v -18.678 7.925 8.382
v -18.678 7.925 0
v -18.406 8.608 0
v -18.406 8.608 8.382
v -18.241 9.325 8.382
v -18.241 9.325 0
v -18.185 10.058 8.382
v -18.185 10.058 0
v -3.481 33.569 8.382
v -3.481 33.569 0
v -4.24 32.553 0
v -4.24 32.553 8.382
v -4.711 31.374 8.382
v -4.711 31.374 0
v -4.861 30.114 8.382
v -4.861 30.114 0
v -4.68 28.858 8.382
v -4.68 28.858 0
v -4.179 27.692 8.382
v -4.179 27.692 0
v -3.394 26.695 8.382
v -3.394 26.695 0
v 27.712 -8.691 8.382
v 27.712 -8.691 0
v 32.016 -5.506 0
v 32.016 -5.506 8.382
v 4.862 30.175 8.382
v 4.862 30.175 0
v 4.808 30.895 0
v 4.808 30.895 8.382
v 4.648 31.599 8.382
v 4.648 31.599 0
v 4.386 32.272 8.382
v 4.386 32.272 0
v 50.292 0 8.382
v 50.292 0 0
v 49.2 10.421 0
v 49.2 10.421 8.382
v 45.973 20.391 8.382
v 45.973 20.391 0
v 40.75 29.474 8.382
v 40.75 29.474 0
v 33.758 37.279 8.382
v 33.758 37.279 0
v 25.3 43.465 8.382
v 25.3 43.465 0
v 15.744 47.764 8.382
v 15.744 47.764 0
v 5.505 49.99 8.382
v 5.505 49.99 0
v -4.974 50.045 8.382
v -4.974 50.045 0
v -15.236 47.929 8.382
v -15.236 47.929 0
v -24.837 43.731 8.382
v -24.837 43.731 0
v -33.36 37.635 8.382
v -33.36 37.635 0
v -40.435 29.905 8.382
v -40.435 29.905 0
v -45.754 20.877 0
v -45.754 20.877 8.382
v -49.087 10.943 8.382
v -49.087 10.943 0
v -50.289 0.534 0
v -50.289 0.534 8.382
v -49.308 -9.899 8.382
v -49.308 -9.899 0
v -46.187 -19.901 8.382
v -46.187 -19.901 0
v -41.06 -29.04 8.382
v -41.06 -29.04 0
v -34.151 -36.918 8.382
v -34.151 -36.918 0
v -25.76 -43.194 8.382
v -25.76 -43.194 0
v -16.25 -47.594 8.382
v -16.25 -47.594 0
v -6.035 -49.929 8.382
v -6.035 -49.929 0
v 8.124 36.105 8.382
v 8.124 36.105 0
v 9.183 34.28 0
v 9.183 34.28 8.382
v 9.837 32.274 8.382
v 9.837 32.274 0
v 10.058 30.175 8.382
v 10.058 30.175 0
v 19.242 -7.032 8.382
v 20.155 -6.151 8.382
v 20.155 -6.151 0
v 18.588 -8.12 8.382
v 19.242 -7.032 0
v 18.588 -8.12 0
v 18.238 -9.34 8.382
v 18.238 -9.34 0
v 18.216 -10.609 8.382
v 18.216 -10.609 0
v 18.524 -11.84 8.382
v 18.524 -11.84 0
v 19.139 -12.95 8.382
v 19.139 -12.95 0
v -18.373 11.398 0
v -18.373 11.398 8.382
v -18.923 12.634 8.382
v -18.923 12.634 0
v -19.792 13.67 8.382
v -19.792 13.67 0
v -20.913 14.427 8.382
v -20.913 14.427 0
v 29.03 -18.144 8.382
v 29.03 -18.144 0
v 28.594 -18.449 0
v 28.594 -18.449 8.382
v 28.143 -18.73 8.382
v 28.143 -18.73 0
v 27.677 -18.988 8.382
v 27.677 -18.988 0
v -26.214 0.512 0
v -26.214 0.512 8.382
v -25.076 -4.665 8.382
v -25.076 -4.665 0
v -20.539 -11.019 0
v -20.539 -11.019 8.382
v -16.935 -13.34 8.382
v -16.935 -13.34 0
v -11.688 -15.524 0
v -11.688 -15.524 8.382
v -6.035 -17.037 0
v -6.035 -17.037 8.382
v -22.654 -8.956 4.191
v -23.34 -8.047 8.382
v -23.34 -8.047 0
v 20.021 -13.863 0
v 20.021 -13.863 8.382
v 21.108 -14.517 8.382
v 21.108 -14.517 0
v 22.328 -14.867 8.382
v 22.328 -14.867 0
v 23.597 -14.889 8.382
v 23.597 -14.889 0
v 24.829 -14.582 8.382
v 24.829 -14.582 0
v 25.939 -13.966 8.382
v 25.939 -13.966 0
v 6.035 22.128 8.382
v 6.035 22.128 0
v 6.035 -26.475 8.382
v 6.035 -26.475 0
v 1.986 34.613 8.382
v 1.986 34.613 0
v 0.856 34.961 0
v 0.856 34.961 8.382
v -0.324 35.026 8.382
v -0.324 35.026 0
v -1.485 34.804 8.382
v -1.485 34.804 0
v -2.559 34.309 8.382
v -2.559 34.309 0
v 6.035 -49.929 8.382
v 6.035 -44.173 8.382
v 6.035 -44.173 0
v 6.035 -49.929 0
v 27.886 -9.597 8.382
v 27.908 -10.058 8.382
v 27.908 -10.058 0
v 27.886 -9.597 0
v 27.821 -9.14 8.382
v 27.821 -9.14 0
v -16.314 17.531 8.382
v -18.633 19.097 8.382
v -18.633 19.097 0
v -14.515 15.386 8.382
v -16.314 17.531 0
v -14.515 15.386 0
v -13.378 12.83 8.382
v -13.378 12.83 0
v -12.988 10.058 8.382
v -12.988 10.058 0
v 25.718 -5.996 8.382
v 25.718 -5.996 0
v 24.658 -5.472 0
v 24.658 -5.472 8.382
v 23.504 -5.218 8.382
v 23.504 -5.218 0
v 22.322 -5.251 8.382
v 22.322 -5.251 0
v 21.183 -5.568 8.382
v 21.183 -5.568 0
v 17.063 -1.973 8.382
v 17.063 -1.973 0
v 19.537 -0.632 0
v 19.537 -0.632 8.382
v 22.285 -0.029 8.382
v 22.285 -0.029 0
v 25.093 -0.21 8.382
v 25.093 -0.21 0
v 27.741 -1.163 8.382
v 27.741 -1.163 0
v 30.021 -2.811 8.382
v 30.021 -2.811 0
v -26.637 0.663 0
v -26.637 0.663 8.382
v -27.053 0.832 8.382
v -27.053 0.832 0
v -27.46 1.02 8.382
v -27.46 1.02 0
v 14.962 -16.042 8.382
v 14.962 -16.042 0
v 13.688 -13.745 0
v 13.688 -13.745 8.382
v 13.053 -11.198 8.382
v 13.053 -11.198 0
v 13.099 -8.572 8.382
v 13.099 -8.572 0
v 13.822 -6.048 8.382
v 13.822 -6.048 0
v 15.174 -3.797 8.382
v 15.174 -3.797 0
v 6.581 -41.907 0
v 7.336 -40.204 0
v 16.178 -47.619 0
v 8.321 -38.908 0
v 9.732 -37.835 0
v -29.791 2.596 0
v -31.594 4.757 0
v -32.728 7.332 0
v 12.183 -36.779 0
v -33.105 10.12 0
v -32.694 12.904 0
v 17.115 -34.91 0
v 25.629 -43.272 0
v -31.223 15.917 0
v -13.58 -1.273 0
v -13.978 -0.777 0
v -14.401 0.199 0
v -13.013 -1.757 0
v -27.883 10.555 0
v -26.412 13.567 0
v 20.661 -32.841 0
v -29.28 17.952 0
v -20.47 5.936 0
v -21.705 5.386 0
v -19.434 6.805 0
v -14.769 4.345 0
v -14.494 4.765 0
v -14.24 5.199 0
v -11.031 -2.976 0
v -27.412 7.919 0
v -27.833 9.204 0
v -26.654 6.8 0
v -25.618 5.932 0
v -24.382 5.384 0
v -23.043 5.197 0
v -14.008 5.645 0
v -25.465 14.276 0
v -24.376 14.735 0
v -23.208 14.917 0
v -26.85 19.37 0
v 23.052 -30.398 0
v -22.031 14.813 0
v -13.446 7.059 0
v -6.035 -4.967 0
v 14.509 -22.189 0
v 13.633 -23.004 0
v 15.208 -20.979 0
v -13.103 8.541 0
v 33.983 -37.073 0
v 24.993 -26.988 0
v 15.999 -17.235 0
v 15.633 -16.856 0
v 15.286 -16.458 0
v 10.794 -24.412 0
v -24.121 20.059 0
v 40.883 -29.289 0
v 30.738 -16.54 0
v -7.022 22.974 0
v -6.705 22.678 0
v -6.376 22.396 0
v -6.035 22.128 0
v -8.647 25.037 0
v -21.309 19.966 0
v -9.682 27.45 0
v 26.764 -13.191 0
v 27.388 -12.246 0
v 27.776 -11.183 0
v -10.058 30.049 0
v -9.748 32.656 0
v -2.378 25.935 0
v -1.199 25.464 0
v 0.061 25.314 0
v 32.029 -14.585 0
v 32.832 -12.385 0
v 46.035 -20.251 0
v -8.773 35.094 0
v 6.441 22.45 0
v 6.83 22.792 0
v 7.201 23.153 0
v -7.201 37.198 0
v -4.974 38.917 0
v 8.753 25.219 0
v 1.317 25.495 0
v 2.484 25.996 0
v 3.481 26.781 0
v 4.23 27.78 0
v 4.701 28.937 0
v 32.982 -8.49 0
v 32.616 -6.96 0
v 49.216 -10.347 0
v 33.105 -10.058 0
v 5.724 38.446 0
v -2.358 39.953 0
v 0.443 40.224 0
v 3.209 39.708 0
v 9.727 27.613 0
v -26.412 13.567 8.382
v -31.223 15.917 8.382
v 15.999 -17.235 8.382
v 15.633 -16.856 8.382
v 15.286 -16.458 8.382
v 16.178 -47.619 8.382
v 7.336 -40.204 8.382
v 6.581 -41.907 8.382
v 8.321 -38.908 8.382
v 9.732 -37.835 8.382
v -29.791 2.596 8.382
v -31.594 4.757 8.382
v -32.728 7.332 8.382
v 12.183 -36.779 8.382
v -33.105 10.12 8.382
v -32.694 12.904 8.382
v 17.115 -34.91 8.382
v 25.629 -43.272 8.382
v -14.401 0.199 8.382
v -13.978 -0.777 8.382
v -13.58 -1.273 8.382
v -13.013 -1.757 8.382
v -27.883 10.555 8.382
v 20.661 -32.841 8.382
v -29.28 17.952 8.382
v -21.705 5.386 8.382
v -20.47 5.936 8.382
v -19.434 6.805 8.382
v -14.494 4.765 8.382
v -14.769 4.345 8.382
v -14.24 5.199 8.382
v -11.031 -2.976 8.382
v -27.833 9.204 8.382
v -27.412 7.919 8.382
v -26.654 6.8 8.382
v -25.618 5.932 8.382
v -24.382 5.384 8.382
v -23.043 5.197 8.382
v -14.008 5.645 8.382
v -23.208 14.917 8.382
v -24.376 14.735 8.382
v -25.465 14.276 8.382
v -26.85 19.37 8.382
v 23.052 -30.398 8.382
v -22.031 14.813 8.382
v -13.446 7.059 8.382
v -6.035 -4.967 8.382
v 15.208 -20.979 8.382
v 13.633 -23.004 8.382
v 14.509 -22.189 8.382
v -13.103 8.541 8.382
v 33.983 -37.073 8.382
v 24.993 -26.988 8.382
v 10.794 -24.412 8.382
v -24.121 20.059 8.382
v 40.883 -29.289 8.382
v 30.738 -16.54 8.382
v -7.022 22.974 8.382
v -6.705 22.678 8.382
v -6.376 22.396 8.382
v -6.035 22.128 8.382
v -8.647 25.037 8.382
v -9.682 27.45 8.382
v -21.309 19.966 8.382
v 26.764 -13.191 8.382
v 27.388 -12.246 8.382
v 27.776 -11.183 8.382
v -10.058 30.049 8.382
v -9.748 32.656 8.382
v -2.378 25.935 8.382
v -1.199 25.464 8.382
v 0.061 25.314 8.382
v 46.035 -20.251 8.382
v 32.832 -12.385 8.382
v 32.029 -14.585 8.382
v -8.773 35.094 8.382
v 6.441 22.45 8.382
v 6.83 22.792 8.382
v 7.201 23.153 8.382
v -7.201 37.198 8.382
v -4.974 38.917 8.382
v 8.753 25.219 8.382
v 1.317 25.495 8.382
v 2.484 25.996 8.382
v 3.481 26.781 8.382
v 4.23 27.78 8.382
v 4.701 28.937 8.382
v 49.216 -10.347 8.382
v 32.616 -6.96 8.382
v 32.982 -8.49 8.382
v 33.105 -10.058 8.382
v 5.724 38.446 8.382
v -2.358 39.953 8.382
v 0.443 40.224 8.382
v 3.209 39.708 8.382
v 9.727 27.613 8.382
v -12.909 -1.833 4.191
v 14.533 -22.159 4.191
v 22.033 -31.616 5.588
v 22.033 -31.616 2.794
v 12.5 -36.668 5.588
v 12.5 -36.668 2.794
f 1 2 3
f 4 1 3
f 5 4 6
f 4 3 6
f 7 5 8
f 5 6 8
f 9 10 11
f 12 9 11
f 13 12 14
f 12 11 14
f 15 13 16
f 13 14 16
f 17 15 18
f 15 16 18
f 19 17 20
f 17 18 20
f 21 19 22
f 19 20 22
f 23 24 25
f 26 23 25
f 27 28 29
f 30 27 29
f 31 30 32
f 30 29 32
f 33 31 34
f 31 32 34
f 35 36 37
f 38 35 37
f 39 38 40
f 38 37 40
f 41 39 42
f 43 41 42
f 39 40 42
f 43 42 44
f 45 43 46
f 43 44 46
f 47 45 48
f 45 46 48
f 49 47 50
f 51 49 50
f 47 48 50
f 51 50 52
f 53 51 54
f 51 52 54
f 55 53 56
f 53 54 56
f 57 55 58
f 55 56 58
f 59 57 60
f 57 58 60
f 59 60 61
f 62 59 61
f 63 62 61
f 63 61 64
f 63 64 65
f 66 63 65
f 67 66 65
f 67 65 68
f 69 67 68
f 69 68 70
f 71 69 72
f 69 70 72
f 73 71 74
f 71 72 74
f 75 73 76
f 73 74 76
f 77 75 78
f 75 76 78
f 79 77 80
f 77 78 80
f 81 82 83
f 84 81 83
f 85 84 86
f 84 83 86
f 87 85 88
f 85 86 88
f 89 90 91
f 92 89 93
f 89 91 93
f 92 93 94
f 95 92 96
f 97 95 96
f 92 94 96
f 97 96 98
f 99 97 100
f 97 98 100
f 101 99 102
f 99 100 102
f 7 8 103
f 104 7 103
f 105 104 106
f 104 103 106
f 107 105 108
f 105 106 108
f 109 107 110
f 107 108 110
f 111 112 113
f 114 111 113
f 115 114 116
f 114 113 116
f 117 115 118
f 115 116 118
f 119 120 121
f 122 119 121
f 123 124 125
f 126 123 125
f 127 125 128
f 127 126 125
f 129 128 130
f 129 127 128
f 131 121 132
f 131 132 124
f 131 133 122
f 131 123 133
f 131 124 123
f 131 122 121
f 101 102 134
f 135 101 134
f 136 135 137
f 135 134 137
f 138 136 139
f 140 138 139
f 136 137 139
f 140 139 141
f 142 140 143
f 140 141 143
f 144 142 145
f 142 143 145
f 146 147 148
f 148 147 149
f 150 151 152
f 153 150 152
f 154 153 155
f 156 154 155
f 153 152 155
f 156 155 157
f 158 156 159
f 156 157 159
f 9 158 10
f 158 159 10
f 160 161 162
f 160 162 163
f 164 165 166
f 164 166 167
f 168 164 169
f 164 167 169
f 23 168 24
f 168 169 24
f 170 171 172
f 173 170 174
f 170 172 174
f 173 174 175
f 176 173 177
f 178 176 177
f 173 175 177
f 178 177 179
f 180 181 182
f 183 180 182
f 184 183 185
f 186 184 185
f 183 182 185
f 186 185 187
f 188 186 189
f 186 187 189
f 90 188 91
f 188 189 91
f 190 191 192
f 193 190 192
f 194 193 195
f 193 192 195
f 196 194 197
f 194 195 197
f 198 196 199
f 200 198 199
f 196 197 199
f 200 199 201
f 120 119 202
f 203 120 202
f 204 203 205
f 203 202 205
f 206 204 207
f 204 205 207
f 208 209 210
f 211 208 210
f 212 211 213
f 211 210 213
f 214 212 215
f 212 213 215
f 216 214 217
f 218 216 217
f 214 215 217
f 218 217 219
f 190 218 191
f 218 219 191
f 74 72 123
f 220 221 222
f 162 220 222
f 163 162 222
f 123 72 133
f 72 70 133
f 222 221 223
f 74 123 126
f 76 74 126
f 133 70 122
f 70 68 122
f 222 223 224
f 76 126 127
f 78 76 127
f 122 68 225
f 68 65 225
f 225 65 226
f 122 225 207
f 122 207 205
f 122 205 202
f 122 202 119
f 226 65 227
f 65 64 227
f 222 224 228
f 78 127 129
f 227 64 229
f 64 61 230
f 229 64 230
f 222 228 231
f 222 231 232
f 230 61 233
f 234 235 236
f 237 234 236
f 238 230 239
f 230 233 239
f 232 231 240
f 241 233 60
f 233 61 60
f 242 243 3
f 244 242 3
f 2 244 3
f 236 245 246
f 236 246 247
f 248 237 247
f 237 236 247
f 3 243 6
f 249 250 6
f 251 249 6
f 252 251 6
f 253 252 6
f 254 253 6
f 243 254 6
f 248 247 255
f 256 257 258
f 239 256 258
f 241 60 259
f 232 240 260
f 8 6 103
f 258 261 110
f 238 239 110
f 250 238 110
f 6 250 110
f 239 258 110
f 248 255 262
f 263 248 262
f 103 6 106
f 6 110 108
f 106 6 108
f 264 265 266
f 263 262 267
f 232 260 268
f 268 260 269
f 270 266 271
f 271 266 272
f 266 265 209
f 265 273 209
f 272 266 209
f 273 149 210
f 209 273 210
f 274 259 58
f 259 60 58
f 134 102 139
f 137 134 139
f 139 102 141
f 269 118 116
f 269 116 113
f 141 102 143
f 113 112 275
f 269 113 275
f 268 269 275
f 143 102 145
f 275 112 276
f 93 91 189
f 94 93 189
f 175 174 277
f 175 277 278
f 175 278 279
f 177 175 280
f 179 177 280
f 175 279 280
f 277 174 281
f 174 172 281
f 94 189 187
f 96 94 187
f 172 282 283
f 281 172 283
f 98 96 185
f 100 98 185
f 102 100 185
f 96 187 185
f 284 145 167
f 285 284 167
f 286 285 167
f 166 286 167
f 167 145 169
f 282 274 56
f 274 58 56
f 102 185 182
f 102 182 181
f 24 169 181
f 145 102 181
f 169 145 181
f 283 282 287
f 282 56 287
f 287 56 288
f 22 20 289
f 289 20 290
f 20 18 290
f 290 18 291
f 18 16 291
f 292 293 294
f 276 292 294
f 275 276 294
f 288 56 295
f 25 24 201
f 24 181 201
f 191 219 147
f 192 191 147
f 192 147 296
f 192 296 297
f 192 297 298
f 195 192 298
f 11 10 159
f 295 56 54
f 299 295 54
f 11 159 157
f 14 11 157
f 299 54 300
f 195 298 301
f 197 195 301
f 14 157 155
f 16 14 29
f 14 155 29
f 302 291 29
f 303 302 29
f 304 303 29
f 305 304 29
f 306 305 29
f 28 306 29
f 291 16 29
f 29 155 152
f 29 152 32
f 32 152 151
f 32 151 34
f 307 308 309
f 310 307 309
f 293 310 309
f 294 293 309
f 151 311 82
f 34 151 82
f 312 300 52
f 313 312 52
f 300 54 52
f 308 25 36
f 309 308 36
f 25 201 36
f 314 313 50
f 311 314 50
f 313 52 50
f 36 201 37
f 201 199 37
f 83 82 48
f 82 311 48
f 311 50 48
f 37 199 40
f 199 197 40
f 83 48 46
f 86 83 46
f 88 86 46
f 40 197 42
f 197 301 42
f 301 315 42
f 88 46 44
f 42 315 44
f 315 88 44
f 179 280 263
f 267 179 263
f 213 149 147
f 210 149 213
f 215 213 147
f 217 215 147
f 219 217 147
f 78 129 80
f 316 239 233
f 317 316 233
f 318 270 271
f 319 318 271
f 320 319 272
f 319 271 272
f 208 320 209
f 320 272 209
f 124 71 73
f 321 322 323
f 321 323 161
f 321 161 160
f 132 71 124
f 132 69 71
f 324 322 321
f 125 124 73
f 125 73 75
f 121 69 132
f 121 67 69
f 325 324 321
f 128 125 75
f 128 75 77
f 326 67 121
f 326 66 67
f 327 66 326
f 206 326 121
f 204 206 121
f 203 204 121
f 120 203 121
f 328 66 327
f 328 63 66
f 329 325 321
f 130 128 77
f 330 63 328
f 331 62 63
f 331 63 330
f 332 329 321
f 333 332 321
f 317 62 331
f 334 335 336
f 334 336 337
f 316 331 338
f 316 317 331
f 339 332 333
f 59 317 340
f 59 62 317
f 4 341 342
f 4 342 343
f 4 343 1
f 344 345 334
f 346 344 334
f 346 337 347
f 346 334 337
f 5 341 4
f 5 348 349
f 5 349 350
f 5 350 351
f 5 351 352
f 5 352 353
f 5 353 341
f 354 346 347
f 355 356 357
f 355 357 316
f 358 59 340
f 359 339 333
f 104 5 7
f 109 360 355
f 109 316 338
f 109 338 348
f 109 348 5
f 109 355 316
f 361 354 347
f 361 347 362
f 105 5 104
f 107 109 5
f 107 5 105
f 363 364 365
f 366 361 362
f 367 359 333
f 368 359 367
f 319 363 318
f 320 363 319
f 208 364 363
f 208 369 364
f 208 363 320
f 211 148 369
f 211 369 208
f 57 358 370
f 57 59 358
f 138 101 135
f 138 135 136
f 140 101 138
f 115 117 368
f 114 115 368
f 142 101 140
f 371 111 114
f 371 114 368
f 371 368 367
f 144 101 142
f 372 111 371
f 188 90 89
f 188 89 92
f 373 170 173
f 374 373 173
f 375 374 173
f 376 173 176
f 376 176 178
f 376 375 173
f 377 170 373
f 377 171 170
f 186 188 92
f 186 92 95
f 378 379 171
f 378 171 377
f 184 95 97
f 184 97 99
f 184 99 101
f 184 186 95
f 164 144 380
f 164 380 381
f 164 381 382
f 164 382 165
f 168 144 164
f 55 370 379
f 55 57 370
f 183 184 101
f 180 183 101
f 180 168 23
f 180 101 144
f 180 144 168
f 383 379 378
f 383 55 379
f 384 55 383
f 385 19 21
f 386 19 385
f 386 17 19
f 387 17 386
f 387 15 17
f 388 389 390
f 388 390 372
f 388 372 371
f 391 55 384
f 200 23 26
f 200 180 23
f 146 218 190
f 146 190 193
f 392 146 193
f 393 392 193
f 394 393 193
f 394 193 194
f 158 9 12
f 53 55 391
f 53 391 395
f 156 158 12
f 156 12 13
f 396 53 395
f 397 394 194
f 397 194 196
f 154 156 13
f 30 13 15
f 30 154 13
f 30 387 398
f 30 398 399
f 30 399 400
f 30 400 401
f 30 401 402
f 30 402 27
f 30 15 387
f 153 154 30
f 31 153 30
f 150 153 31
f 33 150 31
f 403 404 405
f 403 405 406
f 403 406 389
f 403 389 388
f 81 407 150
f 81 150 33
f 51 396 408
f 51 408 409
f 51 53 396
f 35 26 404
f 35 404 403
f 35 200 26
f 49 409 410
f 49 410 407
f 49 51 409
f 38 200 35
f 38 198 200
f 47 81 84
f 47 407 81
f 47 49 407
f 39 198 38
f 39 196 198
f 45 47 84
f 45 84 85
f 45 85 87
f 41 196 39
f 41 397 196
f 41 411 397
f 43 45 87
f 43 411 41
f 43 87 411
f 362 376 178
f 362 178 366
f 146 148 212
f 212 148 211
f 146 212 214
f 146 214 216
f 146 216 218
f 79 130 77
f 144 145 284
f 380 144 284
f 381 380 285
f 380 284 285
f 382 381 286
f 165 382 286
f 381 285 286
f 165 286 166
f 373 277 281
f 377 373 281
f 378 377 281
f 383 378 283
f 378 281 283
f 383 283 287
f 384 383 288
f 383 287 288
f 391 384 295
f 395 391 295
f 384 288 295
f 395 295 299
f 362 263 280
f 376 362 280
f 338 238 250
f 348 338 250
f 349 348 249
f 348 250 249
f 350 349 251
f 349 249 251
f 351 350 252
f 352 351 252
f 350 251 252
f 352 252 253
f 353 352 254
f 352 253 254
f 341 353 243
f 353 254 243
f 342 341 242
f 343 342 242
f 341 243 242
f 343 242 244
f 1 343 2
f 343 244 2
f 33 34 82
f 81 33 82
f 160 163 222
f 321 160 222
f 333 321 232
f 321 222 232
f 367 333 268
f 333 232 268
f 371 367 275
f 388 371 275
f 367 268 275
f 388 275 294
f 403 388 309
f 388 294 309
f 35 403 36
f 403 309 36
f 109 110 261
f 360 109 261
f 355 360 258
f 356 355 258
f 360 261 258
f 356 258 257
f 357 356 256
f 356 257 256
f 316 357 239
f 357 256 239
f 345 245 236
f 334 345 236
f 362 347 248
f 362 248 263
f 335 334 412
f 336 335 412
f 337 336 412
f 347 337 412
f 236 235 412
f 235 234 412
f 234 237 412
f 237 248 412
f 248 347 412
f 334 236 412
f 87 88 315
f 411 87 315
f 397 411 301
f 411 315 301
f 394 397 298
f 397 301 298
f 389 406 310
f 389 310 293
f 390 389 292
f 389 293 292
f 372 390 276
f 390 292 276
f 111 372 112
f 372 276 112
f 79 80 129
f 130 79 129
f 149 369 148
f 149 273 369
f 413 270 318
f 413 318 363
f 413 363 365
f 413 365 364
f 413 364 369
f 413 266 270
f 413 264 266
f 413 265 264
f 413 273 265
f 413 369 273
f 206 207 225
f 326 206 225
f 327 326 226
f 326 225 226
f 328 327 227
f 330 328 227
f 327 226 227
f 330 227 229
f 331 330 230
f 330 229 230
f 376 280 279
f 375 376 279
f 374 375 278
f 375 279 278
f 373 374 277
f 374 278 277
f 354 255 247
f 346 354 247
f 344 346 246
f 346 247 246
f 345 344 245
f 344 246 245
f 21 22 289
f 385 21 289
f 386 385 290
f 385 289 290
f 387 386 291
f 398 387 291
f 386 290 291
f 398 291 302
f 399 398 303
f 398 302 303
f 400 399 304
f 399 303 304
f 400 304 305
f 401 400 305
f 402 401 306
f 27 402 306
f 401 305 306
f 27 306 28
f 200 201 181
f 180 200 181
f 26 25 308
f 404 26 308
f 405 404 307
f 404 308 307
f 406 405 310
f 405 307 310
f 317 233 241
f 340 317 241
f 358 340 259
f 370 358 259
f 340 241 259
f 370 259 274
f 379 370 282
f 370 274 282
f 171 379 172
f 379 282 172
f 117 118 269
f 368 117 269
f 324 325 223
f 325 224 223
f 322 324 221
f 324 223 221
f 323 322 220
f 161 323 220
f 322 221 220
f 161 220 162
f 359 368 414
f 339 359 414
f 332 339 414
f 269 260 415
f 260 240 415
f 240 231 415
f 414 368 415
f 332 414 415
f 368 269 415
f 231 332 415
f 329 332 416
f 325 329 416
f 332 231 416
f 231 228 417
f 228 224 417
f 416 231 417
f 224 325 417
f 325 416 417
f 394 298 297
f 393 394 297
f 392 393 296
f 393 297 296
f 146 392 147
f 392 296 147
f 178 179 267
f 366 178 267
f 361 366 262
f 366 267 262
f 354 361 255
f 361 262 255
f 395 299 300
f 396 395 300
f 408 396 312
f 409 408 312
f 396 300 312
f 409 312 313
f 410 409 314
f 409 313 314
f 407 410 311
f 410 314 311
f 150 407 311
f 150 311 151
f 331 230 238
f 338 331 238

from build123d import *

# Parameters (mm, degrees)
F1_DEPTH = 12.7
F2_SCALE = 0.66


with BuildPart() as f1:
    # F0 (on Top) → F1 (new body)
    with BuildSketch(Plane.XY):
        with BuildLine():
            ThreePointArc((9.144, -75.649370546), (57.0228585744, -50.545361805), (76.2, 0))
            ThreePointArc((76.2, 0), (-50.545361805, 57.0228585744), (-9.144, -75.649370546))
            Line((-9.144, -75.649370546), (-9.144, -25.8135372295))
            add(Edge.make_bspline(
                [(-39.7183440202, 0.7753508904), (-39.4440910843, -2.777005422), (-36.553083053, -17.1021078443), (-18.9419593371, -23.7369574995), (-9.144, -25.8135372295)],
                knots=[0, 0, 0, 0, 0.4252369996, 1, 1, 1, 1], degree=3))
            ThreePointArc((-39.7183440202, 0.7753508904), (-40.6754742648, 1.1288974537), (-41.6068021603, 1.5456969604))
            ThreePointArc((-41.6068021603, 1.5456969604), (-48.8665814514, 9.0976146242), (-49.5365875824, 19.5516543956))
            Line((-49.5365875824, 19.5516543956), (-49.7281257293, 19.6451915248))
            Line((-49.7281257293, 19.6451915248), (-48.6135298352, 21.9275753647))
            Line((-48.6135298352, 21.9275753647), (-47.4989339411, 24.2099592047))
            Line((-47.4989339411, 24.2099592047), (-47.3073957942, 24.1164220755))
            ThreePointArc((-47.3073957942, 24.1164220755), (-38.6511413432, 30.0160080471), (-28.2316514308, 28.9343030396))
            ThreePointArc((-28.2316514308, 28.9343030396), (-21.9929696312, 23.3127613442), (-19.6792267956, 15.24))
            ThreePointArc((-19.6792267956, 15.24), (-20.0706784099, 11.8080601931), (-21.2249237559, 8.5524246353))
            ThreePointArc((-21.2249237559, 8.5524246353), (-21.7640042988, 7.5459944723), (-22.3769164732, 6.5827457137))
            add(Edge.make_bspline(
                [(-22.3769164732, 6.5827457137), (-22.3404298332, 0), (-20.8266819608, -2.6844598977), (-13.5609207024, -6.2294838744), (-9.144, -7.5255372295)],
                knots=[0, 0, 0, 0, 0.4802663243, 1, 1, 1, 1], degree=3))
            Line((-9.144, -7.5255372295), (-9.144, 33.528))
            ThreePointArc((-9.144, 33.528), (-9.9126399717, 34.1442853875), (-10.6398545697, 34.8089462134))
            ThreePointArc((-10.6398545697, 34.8089462134), (-15.2387934395, 45.5282331947), (-10.9110537866, 56.3598545697))
            ThreePointArc((-10.9110537866, 56.3598545697), (-1.4654583891, 60.8893780924), (8.6725291214, 58.2517532149))
            Line((8.6725291214, 58.2517532149), (8.8213456053, 58.4043628816))
            Line((8.8213456053, 58.4043628816), (10.6398545697, 56.6310537866))
            Line((10.6398545697, 56.6310537866), (12.4583635342, 54.8577446917))
            Line((12.4583635342, 54.8577446917), (12.3095470503, 54.705135025))
            ThreePointArc((12.3095470503, 54.705135025), (14.4888767171, 50.445468387), (15.24, 45.72))
            ThreePointArc((15.24, 45.72), (14.1163391095, 39.9766063912), (10.9110537866, 35.0801454303))
            ThreePointArc((10.9110537866, 35.0801454303), (10.0575138307, 34.2699338192), (9.144, 33.528))
            Line((9.144, 33.528), (9.144, -40.114004193))
            add(Edge.make_bspline(
                [(24.2416173395, -26.1141094488), (23.9760214951, -29.019635992), (22.6618021702, -35.5712830239), (16.637557432, -36.5809902221), (9.144, -40.114004193)],
                knots=[0, 0, 0, 0, 0.4233523174, 1, 1, 1, 1], degree=3))
            ThreePointArc((24.2416173395, -26.1141094488), (23.4197381725, -25.2409680236), (22.6690500874, -24.305912564))
            ThreePointArc((22.6690500874, -24.305912564), (19.8464755228, -12.9883852305), (25.8533142316, -2.9898232918))
            ThreePointArc((25.8533142316, -2.9898232918), (35.902476764, -0.0317515966), (45.4870784954, -4.2591935428))
            Line((45.4870784954, -4.2591935428), (45.6584180764, -4.132391318))
            Line((45.6584180764, -4.132391318), (47.1694035038, -6.174087436))
            Line((47.1694035038, -6.174087436), (48.6803889311, -8.2157835541))
            Line((48.6803889311, -8.2157835541), (48.50904935, -8.3425857789))
            ThreePointArc((48.50904935, -8.3425857789), (49.7409422113, -11.6939667042), (50.1592267956, -15.24))
            ThreePointArc((50.1592267956, -15.24), (48.5284535825, -22.0990484954), (43.9851393595, -27.4901767082))
            ThreePointArc((43.9851393595, -27.4901767082), (42.9852650291, -28.1704534806), (41.9345988887, -28.76930724))
            add(Edge.make_bspline(
                [(41.9345988887, -28.76930724), (39.9279943087, -35.8152130856), (35.9444698061, -49.8603623611), (18.2756100818, -55.6743562626), (10.5421582828, -58.6083281826), (9.144, -66.9293478131)],
                knots=[0, 0, 0, 0, 0.3663724735, 0.6899474477, 1, 1, 1, 1], degree=3))
            Line((9.144, -66.9293478131), (9.144, -75.649370546))
        make_face()
        with BuildLine():
            ThreePointArc((-42.246771676, 15.991692773), (-41.3581076897, 11.6624633013), (-38.1515548885, 8.6210868642))
            ThreePointArc((-38.1515548885, 8.6210868642), (-32.5245495467, 8.274120524), (-28.3003136597, 12.007671907))
            ThreePointArc((-28.3003136597, 12.007671907), (-27.7424284092, 13.5812290933), (-27.5532267956, 15.24))
            ThreePointArc((-27.5532267956, 15.24), (-28.6715358328, 19.1418346497), (-31.6868987026, 21.8589131358))
            ThreePointArc((-31.6868987026, 21.8589131358), (-36.057035247, 22.5175921793), (-40.0175798878, 20.5564604529))
            ThreePointArc((-40.0175798878, 20.5564604529), (-40.869813648, 19.5814827089), (-41.5381399314, 18.472328093))
            ThreePointArc((-41.5381399314, 18.472328093), (-42.0019035987, 17.2632758839), (-42.246771676, 15.991692773))
        make_face()
        with BuildLine():
            ThreePointArc((-5.2736759969, 50.8625963754), (-7.3654168291, 45.6273127108), (-5.1425963754, 40.4463240031))
            ThreePointArc((-5.1425963754, 40.4463240031), (0.0926872892, 38.3545831709), (5.2736759969, 40.5774036246))
            ThreePointArc((5.2736759969, 40.5774036246), (6.8228972363, 42.9440264224), (7.366, 45.72))
            ThreePointArc((7.366, 45.72), (7.1836656788, 47.3487735922), (6.6456895426, 48.8969114725))
            ThreePointArc((6.6456895426, 48.8969114725), (5.9866540395, 50.0116115169), (5.1425963754, 50.9936759969))
            ThreePointArc((5.1425963754, 50.9936759969), (4.1396028034, 51.8127534522), (3.0086716137, 52.4435296624))
            ThreePointArc((3.0086716137, 52.4435296624), (-1.3810860685, 52.9553684959), (-5.2736759969, 50.8625963754))
        make_face()
        with BuildLine():
            ThreePointArc((28.9983080533, -19.6218577393), (33.8309463237, -22.5251631152), (39.3010845348, -21.1609187423))
            ThreePointArc((39.3010845348, -21.1609187423), (41.4970197426, -18.5552067728), (42.2852267956, -15.24))
            ThreePointArc((42.2852267956, -15.24), (42.2105358085, -14.1936879636), (41.9879775755, -13.1685950634))
            ThreePointArc((41.9879775755, -13.1685950634), (41.5160007505, -11.962725311), (40.8401455379, -10.8581422607))
            ThreePointArc((40.8401455379, -10.8581422607), (39.9812997643, -9.888983904), (38.9660067208, -9.0852028274))
            ThreePointArc((38.9660067208, -9.0852028274), (34.7149131509, -7.8768341093), (30.5373690563, -9.3190812577))
            ThreePointArc((30.5373690563, -9.3190812577), (27.6340636804, -14.1517195281), (28.9983080533, -19.6218577393))
        make_face()
        with BuildLine():
            ThreePointArc((-48.6135298352, 21.9275753647), (-49.1248182042, 20.7589467049), (-49.5365875824, 19.5516543956))
            Line((-49.5365875824, 19.5516543956), (-42.246771676, 15.991692773))
            ThreePointArc((-42.246771676, 15.991692773), (-42.0019035987, 17.2632758839), (-41.5381399314, 18.472328093))
            Line((-41.5381399314, 18.472328093), (-48.6135298352, 21.9275753647))
        make_face()
        with BuildLine():
            ThreePointArc((47.1694035038, -6.174087436), (46.3683450919, -5.1814071443), (45.4870784954, -4.2591935428))
            Line((45.4870784954, -4.2591935428), (38.9660067208, -9.0852028274))
            ThreePointArc((38.9660067208, -9.0852028274), (39.9812997643, -9.888983904), (40.8401455379, -10.8581422607))
            Line((40.8401455379, -10.8581422607), (47.1694035038, -6.174087436))
        make_face()
        with BuildLine():
            Line((41.9879775755, -13.1685950634), (48.50904935, -8.3425857789))
            ThreePointArc((48.50904935, -8.3425857789), (47.8846418194, -7.230280076), (47.1694035038, -6.174087436))
            Line((47.1694035038, -6.174087436), (40.8401455379, -10.8581422607))
            ThreePointArc((40.8401455379, -10.8581422607), (41.5160007505, -11.962725311), (41.9879775755, -13.1685950634))
        make_face()
        with BuildLine():
            Line((6.6456895426, 48.8969114725), (12.3095470503, 54.705135025))
            ThreePointArc((12.3095470503, 54.705135025), (11.5150357988, 55.7030631848), (10.6398545697, 56.6310537866))
            Line((10.6398545697, 56.6310537866), (5.1425963754, 50.9936759969))
            ThreePointArc((5.1425963754, 50.9936759969), (5.9866540395, 50.0116115169), (6.6456895426, 48.8969114725))
        make_face()
        with BuildLine():
            ThreePointArc((10.6398545697, 56.6310537866), (9.6901345511, 57.48260568), (8.6725291214, 58.2517532149))
            Line((8.6725291214, 58.2517532149), (3.0086716137, 52.4435296624))
            ThreePointArc((3.0086716137, 52.4435296624), (4.1396028034, 51.8127534522), (5.1425963754, 50.9936759969))
            Line((5.1425963754, 50.9936759969), (10.6398545697, 56.6310537866))
        make_face()
        with BuildLine():
            ThreePointArc((-47.3073957942, 24.1164220755), (-48.006304368, 23.0493534056), (-48.6135298352, 21.9275753647))
            Line((-48.6135298352, 21.9275753647), (-41.5381399314, 18.472328093))
            ThreePointArc((-41.5381399314, 18.472328093), (-40.869813648, 19.5814827089), (-40.0175798878, 20.5564604529))
            Line((-40.0175798878, 20.5564604529), (-47.3073957942, 24.1164220755))
        make_face()
        with BuildLine():
            ThreePointArc((47.1694035038, -6.174087436), (47.8846418194, -7.230280076), (48.50904935, -8.3425857789))
            Line((48.50904935, -8.3425857789), (48.6803889311, -8.2157835541))
            Line((48.6803889311, -8.2157835541), (47.1694035038, -6.174087436))
        make_face()
        with BuildLine():
            Line((45.6584180764, -4.132391318), (45.4870784954, -4.2591935428))
            ThreePointArc((45.4870784954, -4.2591935428), (46.3683450919, -5.1814071443), (47.1694035038, -6.174087436))
            Line((47.1694035038, -6.174087436), (45.6584180764, -4.132391318))
        make_face()
        with BuildLine():
            Line((8.8213456053, 58.4043628816), (8.6725291214, 58.2517532149))
            ThreePointArc((8.6725291214, 58.2517532149), (9.6901345511, 57.48260568), (10.6398545697, 56.6310537866))
            Line((10.6398545697, 56.6310537866), (8.8213456053, 58.4043628816))
        make_face()
        with BuildLine():
            ThreePointArc((10.6398545697, 56.6310537866), (11.5150357988, 55.7030631848), (12.3095470503, 54.705135025))
            Line((12.3095470503, 54.705135025), (12.4583635342, 54.8577446917))
            Line((12.4583635342, 54.8577446917), (10.6398545697, 56.6310537866))
        make_face()
        with BuildLine():
            Line((-49.7281257293, 19.6451915248), (-49.5365875824, 19.5516543956))
            ThreePointArc((-49.5365875824, 19.5516543956), (-49.1248182042, 20.7589467049), (-48.6135298352, 21.9275753647))
            Line((-48.6135298352, 21.9275753647), (-49.7281257293, 19.6451915248))
        make_face()
        with BuildLine():
            Line((-47.4989339411, 24.2099592047), (-48.6135298352, 21.9275753647))
            ThreePointArc((-48.6135298352, 21.9275753647), (-48.006304368, 23.0493534056), (-47.3073957942, 24.1164220755))
            Line((-47.3073957942, 24.1164220755), (-47.4989339411, 24.2099592047))
        make_face()
    extrude(amount=F1_DEPTH)


with BuildPart() as f1_1:
    # F2: moved
    add(f1.part.scale(F2_SCALE))


solid = f1_1.part
